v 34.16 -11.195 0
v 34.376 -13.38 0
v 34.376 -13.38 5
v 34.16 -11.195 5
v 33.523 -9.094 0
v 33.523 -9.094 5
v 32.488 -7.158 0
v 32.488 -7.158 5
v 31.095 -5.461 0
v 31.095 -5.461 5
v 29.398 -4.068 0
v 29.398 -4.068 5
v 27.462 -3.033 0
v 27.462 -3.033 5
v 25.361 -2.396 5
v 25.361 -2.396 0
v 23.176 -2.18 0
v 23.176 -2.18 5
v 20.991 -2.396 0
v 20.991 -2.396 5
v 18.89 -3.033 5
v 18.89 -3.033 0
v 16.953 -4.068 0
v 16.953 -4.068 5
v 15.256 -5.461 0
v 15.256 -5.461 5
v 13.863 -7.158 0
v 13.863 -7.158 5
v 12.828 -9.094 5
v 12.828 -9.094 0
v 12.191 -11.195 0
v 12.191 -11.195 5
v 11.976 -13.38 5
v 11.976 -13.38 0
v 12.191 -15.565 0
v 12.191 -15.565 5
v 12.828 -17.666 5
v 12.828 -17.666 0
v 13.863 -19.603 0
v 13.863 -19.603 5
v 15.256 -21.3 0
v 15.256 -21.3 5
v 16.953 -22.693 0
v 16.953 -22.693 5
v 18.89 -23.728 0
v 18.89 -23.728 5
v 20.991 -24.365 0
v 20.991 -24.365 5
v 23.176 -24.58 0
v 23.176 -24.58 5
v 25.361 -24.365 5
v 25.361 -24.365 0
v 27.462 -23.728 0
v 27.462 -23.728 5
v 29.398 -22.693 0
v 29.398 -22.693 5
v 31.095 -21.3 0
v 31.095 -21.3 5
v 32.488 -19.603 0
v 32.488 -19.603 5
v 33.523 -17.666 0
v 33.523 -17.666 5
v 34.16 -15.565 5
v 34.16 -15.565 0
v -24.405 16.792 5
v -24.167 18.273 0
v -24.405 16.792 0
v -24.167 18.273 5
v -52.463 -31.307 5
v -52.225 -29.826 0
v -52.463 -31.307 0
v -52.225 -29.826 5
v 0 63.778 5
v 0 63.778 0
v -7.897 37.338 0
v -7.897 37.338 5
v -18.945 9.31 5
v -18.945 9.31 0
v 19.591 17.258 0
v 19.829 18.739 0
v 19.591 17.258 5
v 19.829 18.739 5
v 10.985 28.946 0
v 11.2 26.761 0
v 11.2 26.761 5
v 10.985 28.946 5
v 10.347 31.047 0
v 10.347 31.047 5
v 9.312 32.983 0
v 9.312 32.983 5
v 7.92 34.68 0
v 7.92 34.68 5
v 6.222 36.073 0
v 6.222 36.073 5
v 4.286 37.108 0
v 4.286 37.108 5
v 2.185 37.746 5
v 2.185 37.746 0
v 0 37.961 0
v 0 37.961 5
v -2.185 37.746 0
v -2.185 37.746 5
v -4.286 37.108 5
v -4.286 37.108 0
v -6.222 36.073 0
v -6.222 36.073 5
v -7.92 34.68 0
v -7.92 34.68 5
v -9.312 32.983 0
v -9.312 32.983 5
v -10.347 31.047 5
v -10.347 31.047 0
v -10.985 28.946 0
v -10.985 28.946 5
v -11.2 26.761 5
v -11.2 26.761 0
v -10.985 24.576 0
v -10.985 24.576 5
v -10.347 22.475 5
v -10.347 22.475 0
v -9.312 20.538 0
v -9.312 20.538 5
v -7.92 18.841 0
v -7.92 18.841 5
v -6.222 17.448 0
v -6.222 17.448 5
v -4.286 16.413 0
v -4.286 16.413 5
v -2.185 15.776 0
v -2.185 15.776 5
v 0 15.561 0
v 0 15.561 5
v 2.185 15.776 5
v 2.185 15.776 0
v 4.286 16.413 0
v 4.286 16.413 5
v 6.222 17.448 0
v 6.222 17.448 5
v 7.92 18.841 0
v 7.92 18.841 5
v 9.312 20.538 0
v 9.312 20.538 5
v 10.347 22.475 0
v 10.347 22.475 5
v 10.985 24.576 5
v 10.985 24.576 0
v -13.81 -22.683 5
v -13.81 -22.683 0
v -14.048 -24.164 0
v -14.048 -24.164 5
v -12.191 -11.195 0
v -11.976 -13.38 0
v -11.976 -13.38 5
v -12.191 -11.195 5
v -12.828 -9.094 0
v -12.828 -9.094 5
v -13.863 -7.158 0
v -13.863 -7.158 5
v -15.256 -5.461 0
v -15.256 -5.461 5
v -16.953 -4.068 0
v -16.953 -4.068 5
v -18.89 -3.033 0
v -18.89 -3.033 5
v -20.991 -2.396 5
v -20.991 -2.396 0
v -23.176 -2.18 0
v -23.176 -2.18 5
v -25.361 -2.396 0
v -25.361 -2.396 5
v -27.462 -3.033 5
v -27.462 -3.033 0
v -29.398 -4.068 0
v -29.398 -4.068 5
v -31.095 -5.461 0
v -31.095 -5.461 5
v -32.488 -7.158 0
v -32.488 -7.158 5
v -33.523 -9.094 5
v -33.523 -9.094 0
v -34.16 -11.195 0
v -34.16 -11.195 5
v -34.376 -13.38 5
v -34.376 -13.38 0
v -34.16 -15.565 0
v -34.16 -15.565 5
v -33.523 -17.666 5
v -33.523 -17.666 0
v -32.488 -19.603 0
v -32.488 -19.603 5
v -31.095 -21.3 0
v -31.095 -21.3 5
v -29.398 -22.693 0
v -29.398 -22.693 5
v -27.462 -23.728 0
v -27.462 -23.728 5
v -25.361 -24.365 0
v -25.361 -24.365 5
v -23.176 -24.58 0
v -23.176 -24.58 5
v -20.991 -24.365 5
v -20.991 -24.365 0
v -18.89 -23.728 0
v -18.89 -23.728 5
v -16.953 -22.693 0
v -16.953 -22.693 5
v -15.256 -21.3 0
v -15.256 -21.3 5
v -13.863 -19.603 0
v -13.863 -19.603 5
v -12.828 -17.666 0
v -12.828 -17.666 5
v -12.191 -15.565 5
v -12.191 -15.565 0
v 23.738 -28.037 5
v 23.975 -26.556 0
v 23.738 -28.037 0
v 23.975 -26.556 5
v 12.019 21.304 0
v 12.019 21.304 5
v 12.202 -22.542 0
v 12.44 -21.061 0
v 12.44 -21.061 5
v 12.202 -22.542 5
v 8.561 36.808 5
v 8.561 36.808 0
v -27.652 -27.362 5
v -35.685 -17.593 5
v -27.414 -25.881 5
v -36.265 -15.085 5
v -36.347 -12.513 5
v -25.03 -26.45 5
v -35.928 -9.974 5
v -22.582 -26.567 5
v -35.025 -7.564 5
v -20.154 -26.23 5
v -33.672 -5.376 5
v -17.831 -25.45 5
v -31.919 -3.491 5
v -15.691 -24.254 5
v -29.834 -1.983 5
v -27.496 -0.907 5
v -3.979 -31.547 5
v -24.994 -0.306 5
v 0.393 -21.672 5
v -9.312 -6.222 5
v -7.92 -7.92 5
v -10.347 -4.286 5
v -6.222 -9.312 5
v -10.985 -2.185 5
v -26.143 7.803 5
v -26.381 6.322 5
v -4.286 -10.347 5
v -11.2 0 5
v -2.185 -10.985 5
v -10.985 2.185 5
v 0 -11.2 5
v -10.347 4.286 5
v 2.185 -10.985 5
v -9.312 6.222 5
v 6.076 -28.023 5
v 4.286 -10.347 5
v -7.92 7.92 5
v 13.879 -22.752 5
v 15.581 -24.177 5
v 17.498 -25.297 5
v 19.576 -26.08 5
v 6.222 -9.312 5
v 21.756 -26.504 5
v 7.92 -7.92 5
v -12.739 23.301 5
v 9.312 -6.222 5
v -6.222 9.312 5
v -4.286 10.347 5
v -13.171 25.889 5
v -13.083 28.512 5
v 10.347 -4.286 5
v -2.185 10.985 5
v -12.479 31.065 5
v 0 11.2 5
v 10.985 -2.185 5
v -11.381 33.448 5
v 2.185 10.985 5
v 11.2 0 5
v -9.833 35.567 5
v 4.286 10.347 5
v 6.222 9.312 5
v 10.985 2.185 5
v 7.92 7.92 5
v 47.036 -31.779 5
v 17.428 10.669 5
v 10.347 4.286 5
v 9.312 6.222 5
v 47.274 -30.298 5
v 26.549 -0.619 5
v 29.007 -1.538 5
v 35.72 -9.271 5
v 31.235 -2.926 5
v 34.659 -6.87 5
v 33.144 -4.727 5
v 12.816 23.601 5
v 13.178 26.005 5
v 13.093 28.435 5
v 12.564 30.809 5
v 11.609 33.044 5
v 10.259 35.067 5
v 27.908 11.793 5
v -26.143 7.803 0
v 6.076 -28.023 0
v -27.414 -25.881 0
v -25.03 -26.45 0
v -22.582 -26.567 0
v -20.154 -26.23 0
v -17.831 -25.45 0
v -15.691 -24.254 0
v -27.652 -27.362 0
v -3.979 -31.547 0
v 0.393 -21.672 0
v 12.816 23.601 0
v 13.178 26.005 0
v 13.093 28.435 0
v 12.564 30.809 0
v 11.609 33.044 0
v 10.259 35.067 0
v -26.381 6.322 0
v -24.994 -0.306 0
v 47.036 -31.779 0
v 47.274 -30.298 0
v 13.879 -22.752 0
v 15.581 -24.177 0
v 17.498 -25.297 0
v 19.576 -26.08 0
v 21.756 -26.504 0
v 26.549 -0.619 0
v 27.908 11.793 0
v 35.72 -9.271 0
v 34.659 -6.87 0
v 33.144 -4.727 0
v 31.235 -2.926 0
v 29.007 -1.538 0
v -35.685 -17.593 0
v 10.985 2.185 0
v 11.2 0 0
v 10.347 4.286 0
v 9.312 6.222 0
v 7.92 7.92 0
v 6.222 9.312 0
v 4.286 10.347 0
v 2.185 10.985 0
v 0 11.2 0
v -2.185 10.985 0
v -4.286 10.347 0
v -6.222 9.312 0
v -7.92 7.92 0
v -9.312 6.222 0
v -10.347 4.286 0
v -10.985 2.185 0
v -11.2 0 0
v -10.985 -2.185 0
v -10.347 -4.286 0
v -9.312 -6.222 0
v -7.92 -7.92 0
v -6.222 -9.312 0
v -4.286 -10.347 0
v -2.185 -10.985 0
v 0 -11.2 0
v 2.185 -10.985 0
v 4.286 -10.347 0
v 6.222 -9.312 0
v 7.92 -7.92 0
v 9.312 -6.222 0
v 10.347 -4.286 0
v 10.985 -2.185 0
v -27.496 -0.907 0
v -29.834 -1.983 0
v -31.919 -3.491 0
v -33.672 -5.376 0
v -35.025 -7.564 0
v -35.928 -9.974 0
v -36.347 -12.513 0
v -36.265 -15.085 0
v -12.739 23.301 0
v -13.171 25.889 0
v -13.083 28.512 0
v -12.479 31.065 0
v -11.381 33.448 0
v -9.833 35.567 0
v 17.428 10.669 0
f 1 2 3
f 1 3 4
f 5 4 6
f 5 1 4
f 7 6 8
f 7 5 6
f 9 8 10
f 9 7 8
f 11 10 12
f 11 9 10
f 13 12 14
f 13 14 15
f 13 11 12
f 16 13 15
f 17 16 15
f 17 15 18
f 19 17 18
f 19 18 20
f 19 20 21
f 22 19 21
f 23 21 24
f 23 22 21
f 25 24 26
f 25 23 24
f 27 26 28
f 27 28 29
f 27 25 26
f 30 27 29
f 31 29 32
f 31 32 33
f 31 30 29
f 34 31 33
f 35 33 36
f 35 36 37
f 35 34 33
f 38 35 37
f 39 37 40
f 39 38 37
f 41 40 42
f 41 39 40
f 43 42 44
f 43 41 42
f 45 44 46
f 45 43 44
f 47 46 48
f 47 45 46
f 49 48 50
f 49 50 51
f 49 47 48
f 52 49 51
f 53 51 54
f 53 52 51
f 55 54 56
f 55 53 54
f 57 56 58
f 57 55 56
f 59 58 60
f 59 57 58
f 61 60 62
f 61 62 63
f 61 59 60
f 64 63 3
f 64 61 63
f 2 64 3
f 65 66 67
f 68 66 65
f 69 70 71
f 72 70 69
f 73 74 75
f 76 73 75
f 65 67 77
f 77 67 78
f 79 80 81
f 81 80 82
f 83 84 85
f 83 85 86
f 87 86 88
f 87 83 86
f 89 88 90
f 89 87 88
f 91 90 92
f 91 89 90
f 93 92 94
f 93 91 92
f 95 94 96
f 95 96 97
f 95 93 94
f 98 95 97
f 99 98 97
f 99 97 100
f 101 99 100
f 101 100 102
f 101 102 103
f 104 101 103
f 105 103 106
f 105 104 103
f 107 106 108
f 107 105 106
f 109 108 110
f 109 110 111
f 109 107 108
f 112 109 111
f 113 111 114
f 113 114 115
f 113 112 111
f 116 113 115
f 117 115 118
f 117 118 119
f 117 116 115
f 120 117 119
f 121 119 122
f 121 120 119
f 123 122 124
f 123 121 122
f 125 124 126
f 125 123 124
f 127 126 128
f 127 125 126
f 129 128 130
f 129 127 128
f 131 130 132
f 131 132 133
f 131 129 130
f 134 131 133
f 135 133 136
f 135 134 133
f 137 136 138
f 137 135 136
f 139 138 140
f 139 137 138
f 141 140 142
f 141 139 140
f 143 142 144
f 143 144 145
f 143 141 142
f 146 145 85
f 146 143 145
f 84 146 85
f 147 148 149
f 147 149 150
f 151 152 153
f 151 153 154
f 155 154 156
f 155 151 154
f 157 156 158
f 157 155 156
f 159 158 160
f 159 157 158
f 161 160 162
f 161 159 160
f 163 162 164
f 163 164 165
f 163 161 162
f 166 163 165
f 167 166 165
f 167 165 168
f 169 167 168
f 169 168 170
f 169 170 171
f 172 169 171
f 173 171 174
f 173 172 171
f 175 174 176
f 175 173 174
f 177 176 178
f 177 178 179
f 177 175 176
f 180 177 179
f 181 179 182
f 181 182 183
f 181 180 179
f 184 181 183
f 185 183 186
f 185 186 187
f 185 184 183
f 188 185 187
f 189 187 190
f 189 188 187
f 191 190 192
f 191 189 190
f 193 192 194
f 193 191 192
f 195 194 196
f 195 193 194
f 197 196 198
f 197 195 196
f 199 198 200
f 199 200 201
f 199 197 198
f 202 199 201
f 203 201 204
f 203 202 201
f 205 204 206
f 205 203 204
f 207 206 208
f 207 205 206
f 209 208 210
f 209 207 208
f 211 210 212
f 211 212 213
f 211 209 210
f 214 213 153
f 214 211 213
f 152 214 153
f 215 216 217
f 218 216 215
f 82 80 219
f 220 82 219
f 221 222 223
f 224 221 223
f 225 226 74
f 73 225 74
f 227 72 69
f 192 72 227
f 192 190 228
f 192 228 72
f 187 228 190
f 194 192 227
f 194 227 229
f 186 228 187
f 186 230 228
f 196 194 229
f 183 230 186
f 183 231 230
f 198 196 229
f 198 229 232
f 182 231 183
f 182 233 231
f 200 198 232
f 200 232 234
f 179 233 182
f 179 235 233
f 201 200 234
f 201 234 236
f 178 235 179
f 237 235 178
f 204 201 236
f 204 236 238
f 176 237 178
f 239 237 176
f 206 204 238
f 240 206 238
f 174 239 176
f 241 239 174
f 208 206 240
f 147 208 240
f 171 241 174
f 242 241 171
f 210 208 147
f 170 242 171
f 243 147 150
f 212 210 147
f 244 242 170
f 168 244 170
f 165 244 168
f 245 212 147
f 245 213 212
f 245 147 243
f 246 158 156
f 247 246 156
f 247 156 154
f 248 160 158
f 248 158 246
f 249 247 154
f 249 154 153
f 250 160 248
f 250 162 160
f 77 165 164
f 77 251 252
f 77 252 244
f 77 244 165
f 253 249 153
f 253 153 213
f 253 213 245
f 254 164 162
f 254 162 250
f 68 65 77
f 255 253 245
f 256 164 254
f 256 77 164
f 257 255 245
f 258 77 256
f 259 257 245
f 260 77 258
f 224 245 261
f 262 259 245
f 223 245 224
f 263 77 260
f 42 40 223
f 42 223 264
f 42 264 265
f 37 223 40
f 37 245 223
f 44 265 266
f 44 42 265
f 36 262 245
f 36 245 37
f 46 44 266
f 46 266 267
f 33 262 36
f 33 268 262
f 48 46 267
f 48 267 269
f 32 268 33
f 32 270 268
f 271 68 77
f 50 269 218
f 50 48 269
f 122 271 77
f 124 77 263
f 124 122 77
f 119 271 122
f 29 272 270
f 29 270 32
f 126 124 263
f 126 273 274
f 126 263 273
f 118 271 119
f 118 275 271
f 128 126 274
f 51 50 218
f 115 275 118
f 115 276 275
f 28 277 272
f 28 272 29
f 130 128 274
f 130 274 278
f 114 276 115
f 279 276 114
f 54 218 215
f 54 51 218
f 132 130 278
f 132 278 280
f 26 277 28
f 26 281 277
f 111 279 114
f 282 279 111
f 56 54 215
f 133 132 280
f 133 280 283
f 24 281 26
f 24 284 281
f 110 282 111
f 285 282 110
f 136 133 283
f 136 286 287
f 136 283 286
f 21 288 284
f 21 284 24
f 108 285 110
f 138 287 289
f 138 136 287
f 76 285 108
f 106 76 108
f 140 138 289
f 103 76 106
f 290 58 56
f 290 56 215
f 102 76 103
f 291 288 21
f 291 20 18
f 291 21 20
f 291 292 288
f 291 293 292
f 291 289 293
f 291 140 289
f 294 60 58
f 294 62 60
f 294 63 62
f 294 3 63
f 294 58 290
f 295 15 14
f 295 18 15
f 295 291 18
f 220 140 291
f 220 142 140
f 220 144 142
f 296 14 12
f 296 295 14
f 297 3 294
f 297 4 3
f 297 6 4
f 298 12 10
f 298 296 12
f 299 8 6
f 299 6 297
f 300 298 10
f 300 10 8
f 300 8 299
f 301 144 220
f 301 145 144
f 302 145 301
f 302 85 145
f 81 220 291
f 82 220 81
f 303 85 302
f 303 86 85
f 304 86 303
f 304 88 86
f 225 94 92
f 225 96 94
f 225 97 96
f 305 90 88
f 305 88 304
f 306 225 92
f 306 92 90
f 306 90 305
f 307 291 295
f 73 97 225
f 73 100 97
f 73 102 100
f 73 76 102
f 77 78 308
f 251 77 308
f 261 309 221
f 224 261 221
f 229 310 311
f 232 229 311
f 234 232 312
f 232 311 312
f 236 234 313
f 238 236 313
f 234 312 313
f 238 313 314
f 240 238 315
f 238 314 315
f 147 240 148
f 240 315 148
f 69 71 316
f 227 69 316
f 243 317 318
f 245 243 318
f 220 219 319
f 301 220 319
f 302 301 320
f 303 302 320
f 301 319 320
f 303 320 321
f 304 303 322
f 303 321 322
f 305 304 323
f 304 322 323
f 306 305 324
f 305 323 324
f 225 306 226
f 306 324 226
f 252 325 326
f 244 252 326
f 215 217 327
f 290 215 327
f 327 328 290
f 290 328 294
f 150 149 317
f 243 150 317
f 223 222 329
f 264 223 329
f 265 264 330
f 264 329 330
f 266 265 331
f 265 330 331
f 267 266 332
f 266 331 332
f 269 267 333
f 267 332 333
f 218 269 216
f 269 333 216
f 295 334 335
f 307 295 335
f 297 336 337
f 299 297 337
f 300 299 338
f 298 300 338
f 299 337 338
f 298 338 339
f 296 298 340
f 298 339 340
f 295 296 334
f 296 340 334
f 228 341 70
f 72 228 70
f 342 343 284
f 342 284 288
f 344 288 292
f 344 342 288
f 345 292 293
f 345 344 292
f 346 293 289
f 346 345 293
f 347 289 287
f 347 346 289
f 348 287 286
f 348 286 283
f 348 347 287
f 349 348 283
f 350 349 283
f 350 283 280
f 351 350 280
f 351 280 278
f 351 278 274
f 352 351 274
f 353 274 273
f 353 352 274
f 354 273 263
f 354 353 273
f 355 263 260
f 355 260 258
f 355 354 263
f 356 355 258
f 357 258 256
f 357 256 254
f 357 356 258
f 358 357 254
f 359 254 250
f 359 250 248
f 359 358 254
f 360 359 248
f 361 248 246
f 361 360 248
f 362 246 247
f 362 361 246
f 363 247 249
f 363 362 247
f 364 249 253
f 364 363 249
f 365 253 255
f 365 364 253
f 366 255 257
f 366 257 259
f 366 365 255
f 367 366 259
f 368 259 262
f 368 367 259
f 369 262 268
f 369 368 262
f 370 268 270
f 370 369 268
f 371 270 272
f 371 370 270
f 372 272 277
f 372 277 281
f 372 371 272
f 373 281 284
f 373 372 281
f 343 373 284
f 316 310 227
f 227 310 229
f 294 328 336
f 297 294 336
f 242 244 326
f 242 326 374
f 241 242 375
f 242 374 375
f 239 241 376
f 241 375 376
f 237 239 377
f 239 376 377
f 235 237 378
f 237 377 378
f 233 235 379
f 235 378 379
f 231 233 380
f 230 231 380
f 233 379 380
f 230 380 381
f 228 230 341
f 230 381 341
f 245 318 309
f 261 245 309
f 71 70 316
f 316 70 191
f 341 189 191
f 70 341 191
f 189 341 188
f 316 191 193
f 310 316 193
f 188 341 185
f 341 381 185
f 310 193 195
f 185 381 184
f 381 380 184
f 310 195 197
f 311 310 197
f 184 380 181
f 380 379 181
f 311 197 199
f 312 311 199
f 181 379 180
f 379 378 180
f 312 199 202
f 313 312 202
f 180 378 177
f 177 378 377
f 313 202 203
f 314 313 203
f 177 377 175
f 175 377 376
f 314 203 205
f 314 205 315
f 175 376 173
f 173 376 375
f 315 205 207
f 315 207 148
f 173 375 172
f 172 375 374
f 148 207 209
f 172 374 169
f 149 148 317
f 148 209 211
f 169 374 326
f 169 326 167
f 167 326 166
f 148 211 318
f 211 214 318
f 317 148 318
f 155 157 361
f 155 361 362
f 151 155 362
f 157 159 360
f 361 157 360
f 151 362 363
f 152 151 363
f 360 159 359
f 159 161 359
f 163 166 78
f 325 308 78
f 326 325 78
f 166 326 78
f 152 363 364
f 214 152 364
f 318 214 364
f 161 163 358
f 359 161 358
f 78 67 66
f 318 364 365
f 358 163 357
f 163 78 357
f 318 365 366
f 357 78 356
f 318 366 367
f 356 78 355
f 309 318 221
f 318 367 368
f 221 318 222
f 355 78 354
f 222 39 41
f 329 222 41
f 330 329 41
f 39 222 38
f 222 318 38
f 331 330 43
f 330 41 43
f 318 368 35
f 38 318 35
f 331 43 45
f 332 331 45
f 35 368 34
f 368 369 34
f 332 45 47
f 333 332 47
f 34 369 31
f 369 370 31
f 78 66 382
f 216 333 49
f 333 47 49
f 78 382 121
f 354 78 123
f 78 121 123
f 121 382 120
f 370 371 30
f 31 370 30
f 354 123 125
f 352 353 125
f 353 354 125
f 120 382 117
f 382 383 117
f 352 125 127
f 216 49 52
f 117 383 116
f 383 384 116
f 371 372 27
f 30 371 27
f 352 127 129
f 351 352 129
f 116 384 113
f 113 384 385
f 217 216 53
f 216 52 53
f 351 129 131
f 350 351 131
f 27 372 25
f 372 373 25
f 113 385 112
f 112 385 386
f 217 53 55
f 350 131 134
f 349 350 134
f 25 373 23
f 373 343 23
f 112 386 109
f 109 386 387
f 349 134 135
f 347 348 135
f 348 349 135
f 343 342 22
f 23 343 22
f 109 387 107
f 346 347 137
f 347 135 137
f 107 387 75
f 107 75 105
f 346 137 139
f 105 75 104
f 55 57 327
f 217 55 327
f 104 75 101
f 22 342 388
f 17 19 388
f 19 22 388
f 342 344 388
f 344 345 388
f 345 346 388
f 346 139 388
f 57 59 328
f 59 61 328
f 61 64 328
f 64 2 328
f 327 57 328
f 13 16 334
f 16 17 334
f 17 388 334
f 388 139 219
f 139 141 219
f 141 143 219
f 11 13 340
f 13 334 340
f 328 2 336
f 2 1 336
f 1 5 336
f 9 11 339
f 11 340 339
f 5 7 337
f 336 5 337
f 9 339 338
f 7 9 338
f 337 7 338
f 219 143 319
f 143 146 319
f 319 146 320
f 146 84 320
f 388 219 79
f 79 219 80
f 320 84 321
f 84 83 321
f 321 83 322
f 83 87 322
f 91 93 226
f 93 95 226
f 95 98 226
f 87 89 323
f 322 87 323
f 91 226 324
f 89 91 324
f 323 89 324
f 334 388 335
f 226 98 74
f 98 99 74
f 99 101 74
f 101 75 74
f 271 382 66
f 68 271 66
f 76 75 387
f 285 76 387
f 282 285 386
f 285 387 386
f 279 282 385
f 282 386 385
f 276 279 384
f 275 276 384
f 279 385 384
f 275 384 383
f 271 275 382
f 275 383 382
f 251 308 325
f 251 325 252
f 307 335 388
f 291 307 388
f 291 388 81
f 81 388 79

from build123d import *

# Parameters (mm, degrees)
F0_R     = 11.2
F1_DEPTH = 5
F2_DEPTH = 1.5


with BuildPart() as f1:
    # F0 (on Top) → F1 (new body)
    with BuildSketch(Plane.XY):
        with BuildLine():
            Line((19.8292478766, 18.7391326068), (12.019146986, 21.3037386799))
            ThreePointArc((12.019146986, 21.3037386799), (12.8834926091, 29.6341129855), (8.5614465057, 36.807825198))
            ThreePointArc((8.5614465057, 36.807825198), (0.4252472579, 39.9540022295), (-7.8966710373, 37.3383103516))
            ThreePointArc((-7.8966710373, 37.3383103516), (-12.4785048645, 31.0651442851), (-12.7385668251, 23.3012418196))
            Line((-12.7385668251, 23.3012418196), (-24.16729182, 18.2728301734))
            Line((-24.16729182, 18.2728301734), (-17.8012736142, 9.5490273088))
            Line((-17.8012736142, 9.5490273088), (-26.1431888207, 7.8030660957))
            Line((-26.1431888207, 7.8030660957), (-24.4591523854, -0.2429827182))
            ThreePointArc((-24.4591523854, -0.2429827182), (-34.257920026, -6.2095327762), (-35.6854263912, -17.5927569437))
            ThreePointArc((-35.6854263912, -17.5927569437), (-32.5191731961, -22.7044417143), (-27.414141389, -25.8814105115))
            ThreePointArc((-27.414141389, -25.8814105115), (-20.154107372, -26.2299680627), (-13.8101839429, -22.6825433882))
            Line((-13.8101839429, -22.6825433882), (-3.7410892192, -30.0659037435))
            Line((-3.7410892192, -30.0659037435), (0.6309365762, -20.190868824))
            Line((0.6309365762, -20.190868824), (6.3139409441, -26.5421987025))
            Line((6.3139409441, -26.5421987025), (12.4400053994, -21.0607559617))
            ThreePointArc((12.4400053994, -21.0607559617), (17.4984717531, -25.2972406894), (23.9754292514, -26.5561712933))
            ThreePointArc((23.9754292514, -26.5561712933), (34.0938615727, -20.7987226024), (35.7196142534, -9.2710248144))
            ThreePointArc((35.7196142534, -9.2710248144), (32.2340037157, -3.7791277286), (26.5487507681, -0.6186984314))
            Line((26.5487507681, -0.6186984314), (27.9083810392, 11.7930735701))
            Line((27.9083810392, 11.7930735701), (17.170337038, 10.6418415152))
            Line((17.170337038, 10.6418415152), (19.8292478766, 18.7391326068))
        make_face()
        with Locations((-23.1755792411, -13.3804269135)):
            Circle(F0_R, mode=Mode.SUBTRACT)
        with Locations((23.1755792411, -13.3804269135)):
            Circle(F0_R, mode=Mode.SUBTRACT)
        Circle(F0_R, mode=Mode.SUBTRACT)
        with Locations((0, 26.760853827)):
            Circle(F0_R, mode=Mode.SUBTRACT)
        with BuildLine():
            ThreePointArc((-27.414141389, -25.8814105115), (-32.5191731961, -22.7044417143), (-35.6854263912, -17.5927569437))
            Line((-35.6854263912, -17.5927569437), (-52.2249266505, -29.8259742558))
            Line((-52.2249266505, -29.8259742558), (-27.414141389, -25.8814105115))
        make_face()
        with BuildLine():
            Line((47.2735762596, -30.2975326777), (35.7196142534, -9.2710248144))
            ThreePointArc((35.7196142534, -9.2710248144), (34.0938615727, -20.7987226024), (23.9754292514, -26.5561712933))
            Line((23.9754292514, -26.5561712933), (47.2735762596, -30.2975326777))
        make_face()
        with BuildLine():
            ThreePointArc((-7.8966710373, 37.3383103516), (0.4252472579, 39.9540022295), (8.5614465057, 36.807825198))
            Line((8.5614465057, 36.807825198), (0, 63.7780725956))
            Line((0, 63.7780725956), (-7.8966710373, 37.3383103516))
        make_face()
    extrude(amount=F1_DEPTH)

    # F2 (add): faces of the model
    f2_faces = [f1.faces().sort_by_distance(p)[0] for p in [
        (35.6245027555, -28.4268519855, 2.5),
        (41.4965952565, -19.784278746, 2.5),
        (18.4997924573, 14.690487061, 2.5),
        (4.2807232528, 50.2929488968, 2.5),
        (-39.8195340198, -27.8536923837, 2.5),
        (-1.5550763215, -25.1283862838, 2.5),
        (9.3769731717, -23.8014773321, 2.5),
        (-8.775636581, -26.3742235658, 2.5),
        (22.5393590386, 11.2174575427, 2.5),
        (27.2285659036, 5.5871875694, 2.5),
        (3.4724387602, -23.3665337633, 2.5),
        (-25.3011706031, 3.7800416887, 2.5),
        (-20.9842827171, 13.9109287411, 2.5),
        (-3.9483355186, 50.5581914736, 2.5),
        (-18.4529293226, 20.7870359965, 2.5),
        (-21.9722312174, 8.6760467023, 2.5),
        (15.9241974313, 20.0214356434, 2.5),
    ]]
    extrude(f2_faces, amount=F2_DEPTH, dir=(-0.1585548331, -0.9873501734, 0))


solid = f1.part
